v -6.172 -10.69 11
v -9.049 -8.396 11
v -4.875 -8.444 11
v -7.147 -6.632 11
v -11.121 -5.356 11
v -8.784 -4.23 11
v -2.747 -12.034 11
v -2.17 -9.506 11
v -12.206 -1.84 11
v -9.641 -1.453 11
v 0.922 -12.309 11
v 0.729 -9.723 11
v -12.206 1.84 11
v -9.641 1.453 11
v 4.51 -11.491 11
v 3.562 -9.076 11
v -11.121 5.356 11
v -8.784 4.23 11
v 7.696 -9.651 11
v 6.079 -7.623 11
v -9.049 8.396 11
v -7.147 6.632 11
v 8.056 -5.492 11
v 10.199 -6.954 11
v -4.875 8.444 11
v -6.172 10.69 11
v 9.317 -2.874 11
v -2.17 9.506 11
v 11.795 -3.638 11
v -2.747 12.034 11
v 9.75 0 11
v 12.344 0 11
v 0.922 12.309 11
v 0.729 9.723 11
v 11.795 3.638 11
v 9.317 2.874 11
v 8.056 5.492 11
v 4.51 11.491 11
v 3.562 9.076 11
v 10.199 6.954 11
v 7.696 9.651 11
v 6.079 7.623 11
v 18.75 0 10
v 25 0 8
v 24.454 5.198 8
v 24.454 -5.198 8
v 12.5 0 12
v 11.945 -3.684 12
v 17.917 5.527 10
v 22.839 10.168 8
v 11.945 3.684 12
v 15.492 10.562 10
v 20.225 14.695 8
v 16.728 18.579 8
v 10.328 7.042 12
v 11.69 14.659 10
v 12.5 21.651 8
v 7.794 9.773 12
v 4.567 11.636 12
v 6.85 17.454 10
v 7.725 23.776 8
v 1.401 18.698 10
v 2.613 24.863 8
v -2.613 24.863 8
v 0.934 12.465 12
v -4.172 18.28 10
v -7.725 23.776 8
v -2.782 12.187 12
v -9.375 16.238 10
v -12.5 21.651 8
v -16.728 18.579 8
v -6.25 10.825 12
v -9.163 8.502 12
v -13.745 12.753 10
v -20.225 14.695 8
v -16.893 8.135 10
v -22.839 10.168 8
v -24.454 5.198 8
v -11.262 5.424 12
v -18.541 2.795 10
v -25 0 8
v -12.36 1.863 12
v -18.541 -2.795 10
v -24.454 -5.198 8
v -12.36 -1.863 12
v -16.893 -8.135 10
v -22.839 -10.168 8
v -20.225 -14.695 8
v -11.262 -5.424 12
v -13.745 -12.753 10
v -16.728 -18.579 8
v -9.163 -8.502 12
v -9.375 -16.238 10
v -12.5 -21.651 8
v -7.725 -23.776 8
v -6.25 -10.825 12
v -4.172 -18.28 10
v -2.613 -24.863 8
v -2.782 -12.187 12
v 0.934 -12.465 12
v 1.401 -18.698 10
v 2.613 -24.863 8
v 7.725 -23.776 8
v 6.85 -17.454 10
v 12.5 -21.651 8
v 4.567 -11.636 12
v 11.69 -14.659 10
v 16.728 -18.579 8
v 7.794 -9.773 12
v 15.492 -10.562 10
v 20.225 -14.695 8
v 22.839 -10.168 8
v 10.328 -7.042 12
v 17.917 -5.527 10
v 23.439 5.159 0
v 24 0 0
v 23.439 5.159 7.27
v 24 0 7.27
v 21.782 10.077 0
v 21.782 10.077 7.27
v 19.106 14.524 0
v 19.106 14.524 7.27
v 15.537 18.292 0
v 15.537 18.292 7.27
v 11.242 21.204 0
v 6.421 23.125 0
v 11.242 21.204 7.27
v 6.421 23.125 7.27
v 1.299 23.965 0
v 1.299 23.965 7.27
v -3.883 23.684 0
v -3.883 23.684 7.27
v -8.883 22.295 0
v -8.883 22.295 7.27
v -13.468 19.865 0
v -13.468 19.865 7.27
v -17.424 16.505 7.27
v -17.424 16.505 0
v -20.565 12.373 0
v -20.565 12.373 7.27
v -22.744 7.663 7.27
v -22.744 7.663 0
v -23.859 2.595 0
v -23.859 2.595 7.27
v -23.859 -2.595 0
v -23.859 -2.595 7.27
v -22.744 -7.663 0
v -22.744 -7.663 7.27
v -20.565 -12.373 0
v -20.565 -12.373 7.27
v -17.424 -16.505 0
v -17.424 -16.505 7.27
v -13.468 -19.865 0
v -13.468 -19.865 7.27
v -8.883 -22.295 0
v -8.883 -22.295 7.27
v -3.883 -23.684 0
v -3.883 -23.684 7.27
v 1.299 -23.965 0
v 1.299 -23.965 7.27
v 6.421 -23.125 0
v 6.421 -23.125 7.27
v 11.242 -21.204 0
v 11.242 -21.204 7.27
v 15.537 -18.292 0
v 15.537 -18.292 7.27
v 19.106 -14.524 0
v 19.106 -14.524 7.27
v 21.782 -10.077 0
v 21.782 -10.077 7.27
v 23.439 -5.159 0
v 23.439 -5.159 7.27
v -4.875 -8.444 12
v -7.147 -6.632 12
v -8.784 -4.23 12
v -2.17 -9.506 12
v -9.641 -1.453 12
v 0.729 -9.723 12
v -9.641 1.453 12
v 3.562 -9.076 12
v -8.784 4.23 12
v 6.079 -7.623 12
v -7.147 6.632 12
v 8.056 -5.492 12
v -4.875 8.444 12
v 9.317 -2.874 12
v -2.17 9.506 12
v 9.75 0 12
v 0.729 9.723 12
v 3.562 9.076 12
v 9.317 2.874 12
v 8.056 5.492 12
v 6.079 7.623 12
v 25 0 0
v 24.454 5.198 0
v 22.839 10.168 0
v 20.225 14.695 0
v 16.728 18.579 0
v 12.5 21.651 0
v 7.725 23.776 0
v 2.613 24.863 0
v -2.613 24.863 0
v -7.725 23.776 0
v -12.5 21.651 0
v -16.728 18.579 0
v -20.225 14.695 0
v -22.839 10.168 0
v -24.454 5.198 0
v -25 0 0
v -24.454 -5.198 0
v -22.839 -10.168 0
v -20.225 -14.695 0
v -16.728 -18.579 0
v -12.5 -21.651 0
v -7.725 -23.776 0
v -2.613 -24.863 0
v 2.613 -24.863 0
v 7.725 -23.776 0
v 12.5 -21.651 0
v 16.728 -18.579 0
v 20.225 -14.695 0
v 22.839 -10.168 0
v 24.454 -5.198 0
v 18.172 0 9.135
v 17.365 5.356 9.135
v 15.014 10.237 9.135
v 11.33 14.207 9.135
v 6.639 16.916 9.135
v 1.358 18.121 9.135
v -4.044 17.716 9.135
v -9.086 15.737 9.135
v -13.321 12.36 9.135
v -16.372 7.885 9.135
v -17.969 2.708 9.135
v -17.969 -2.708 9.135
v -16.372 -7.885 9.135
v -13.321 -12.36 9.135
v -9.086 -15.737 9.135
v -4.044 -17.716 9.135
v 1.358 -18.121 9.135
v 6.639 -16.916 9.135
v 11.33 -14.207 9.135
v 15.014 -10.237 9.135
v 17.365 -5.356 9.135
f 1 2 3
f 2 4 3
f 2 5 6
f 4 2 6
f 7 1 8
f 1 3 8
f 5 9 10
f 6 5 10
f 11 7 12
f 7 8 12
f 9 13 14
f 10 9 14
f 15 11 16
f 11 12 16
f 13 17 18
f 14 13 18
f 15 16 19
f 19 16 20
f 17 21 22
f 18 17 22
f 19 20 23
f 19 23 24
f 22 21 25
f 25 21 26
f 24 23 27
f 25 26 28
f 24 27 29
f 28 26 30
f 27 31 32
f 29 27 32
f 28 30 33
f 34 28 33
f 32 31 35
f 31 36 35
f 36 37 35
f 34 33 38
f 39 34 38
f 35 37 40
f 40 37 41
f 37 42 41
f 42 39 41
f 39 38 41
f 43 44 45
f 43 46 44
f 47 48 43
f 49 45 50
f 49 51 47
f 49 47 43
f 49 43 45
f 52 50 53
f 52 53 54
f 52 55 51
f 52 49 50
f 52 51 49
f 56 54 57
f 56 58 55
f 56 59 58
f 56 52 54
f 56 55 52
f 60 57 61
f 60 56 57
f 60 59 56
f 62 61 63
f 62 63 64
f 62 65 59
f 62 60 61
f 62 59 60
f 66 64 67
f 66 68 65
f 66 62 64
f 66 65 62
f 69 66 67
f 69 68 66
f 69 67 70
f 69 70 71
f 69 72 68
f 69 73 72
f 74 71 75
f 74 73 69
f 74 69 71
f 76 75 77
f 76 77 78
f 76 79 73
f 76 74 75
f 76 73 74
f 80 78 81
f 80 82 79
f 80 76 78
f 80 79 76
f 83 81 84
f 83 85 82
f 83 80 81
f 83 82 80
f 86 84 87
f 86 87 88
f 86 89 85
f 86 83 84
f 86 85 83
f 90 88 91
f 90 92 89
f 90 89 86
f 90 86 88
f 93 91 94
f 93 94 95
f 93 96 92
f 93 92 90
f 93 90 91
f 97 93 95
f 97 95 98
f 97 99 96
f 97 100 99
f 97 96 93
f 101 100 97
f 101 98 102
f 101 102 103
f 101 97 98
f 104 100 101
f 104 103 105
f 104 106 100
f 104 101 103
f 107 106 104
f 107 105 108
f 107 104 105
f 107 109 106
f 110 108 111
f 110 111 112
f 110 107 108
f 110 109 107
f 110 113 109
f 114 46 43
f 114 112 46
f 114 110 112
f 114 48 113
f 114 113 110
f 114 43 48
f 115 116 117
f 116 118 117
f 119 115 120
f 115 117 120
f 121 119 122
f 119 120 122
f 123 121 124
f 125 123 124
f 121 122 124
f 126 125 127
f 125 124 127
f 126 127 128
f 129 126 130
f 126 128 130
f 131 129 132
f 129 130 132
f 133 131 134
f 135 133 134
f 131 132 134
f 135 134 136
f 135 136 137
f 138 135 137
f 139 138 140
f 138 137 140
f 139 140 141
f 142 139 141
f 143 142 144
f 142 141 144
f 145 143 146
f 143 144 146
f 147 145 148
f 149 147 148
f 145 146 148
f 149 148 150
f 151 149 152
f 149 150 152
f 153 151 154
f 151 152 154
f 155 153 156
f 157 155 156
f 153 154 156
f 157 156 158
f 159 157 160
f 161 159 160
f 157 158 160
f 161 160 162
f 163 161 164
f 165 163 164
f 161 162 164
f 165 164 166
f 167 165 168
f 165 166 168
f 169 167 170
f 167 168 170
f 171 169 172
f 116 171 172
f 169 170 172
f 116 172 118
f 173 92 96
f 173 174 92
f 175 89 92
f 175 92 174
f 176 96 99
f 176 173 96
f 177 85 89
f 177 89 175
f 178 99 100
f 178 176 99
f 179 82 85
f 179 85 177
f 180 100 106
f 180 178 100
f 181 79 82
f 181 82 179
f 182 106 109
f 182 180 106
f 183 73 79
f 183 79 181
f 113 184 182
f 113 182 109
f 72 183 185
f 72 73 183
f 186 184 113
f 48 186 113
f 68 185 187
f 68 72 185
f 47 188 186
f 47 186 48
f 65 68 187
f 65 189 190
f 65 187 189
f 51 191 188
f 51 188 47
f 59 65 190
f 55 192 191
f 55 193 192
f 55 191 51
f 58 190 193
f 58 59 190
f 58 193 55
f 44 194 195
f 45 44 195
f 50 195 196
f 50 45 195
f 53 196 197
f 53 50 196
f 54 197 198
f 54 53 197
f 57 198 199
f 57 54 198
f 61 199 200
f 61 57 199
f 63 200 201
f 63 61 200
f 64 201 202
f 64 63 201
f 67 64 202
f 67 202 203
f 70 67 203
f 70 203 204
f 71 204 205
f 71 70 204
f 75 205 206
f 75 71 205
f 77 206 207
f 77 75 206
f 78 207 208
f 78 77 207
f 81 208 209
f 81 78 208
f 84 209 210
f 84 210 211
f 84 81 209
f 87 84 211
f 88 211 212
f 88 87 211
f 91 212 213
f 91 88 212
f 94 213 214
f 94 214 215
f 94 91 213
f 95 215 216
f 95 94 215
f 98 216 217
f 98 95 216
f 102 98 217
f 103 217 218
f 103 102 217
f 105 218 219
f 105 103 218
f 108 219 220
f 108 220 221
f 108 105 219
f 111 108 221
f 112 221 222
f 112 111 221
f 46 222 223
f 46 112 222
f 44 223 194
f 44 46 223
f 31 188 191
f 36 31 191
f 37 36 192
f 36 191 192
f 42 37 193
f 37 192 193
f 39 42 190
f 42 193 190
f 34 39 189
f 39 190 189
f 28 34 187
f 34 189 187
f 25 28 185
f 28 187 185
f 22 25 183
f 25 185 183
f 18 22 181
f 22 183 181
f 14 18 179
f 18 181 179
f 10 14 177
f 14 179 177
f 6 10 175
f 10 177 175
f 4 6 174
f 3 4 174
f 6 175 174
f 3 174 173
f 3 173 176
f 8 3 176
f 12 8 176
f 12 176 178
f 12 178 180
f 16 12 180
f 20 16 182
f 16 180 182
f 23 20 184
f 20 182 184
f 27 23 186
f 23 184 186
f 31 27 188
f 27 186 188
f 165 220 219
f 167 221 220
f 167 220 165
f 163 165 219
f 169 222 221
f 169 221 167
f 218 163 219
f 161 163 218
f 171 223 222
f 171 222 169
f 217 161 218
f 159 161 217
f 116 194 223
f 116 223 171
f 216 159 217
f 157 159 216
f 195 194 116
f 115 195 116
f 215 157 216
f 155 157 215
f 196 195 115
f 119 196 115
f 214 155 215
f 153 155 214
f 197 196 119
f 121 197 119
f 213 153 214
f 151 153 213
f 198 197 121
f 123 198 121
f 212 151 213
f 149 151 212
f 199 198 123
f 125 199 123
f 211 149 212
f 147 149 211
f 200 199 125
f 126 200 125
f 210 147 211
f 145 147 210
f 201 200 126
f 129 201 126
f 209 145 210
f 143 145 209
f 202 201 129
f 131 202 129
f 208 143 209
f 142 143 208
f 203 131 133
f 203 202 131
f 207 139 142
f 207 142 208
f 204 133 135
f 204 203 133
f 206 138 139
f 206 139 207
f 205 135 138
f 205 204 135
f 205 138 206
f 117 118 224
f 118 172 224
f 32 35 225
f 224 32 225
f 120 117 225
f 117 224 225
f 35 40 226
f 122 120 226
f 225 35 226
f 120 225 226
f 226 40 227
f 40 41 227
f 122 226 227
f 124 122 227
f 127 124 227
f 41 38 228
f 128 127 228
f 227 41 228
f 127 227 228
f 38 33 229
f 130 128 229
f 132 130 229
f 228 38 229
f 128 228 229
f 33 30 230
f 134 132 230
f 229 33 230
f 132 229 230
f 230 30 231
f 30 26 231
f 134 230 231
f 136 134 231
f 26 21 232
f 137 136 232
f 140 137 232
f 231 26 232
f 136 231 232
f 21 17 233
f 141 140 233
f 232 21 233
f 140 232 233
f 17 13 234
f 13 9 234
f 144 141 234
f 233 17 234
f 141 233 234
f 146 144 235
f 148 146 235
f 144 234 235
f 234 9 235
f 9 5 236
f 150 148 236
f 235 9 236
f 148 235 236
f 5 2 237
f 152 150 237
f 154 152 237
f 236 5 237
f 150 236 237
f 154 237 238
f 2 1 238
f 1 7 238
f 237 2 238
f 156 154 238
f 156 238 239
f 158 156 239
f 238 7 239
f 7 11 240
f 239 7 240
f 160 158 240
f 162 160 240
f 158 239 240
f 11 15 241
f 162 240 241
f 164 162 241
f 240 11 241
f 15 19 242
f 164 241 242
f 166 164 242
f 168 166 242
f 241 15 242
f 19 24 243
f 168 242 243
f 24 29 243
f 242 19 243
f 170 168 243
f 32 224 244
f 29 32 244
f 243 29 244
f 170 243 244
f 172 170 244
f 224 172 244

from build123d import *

# Parameters (mm, degrees)
F2_T     = -1
F3_R     = 9.75
F4_DEPTH = 1


with BuildPart() as f1:
    # F0 (on Front) → F1 (revolve)
    with BuildSketch(Plane.XZ):
        Polygon((0, 12), (0, 0), (25, 0), (25, 8), (12.5, 12), align=None)
    revolve(axis=Axis((0, 0, 39.176005), (0, 0, 1)))

    # F2
    f2_openings = [f1.faces().sort_by_distance(p)[0] for p in [
        (0, 0, 0),
    ]]
    offset(amount=F2_T, openings=f2_openings)

    # F3 (on face) → F4 (cut, through all)
    with BuildSketch(Plane.XY.offset(12)):
        Circle(F3_R)
    extrude(amount=-F4_DEPTH, mode=Mode.SUBTRACT)


solid = f1.part
